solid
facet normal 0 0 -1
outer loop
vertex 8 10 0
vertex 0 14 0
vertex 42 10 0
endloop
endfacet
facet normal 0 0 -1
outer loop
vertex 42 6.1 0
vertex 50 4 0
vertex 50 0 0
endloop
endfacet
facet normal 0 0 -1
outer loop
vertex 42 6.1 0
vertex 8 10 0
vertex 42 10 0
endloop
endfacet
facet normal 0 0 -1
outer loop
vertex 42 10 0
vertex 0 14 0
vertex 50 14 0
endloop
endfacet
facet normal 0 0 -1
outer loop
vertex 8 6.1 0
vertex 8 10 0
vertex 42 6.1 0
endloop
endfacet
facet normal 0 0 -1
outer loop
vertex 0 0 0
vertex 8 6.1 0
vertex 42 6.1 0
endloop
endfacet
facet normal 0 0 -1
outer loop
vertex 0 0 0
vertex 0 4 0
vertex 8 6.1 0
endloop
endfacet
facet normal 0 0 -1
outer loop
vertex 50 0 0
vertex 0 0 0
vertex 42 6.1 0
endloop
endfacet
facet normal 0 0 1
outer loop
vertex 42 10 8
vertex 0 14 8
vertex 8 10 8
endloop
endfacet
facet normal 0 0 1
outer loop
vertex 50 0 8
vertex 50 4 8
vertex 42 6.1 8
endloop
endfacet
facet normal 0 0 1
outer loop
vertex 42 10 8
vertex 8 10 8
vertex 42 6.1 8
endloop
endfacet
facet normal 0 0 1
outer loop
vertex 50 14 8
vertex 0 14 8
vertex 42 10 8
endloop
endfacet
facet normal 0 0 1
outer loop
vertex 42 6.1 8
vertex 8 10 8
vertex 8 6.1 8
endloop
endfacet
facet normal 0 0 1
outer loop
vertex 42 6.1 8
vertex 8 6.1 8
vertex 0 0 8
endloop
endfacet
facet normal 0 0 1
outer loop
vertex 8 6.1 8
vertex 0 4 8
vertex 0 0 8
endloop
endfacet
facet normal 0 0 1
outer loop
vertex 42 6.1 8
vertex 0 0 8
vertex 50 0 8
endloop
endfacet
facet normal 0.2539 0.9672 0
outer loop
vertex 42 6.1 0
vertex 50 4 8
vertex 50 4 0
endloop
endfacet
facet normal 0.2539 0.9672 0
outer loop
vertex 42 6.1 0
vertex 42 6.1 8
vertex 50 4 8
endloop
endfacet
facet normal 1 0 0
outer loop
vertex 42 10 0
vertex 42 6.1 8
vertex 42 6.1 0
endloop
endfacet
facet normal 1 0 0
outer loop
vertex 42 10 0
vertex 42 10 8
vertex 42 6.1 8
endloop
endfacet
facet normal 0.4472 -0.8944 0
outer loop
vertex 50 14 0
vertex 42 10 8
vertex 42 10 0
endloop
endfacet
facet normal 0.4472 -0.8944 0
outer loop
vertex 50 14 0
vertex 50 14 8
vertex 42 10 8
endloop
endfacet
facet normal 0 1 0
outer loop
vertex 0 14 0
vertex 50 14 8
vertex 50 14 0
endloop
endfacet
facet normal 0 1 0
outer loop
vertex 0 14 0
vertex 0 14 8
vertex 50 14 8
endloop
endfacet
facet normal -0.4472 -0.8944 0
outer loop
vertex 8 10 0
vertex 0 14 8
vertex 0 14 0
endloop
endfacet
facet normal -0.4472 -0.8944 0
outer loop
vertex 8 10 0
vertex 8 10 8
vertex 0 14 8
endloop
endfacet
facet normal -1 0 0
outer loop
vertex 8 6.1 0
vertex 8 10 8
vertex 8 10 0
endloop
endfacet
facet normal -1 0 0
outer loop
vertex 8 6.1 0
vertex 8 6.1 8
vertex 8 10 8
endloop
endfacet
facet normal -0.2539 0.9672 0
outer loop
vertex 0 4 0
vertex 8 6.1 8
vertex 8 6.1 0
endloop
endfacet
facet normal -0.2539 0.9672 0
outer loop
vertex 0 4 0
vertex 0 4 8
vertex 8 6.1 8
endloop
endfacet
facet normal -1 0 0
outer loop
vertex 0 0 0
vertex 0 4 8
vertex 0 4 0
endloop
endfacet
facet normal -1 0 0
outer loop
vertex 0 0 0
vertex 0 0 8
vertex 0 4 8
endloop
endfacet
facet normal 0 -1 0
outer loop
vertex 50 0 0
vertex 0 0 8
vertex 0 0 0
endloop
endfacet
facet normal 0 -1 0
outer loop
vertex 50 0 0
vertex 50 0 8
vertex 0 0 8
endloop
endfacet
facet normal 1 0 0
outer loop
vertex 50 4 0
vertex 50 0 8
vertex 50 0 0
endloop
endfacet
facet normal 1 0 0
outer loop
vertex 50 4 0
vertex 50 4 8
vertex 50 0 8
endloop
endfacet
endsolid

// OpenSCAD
$fn = 32;

// ----------------------------------------------------------------------
// Key bar: dovetail key, 8 mm thick
// ----------------------------------------------------------------------

// --- parameters (mm) ---
profile_height = 8;       // extrusion height
profile_points = 10;      // points of the closed outline

profile = [[0, 0], [50, 0], [50, 4], [42, 6.1], [42, 10], [50, 14], [0, 14], [8, 10], [8, 6.1], [0, 4]];  // single closed polygon, 10 points, counter clockwise

// --- the one profile operation ---
linear_extrude(height = profile_height) polygon(points = profile);
